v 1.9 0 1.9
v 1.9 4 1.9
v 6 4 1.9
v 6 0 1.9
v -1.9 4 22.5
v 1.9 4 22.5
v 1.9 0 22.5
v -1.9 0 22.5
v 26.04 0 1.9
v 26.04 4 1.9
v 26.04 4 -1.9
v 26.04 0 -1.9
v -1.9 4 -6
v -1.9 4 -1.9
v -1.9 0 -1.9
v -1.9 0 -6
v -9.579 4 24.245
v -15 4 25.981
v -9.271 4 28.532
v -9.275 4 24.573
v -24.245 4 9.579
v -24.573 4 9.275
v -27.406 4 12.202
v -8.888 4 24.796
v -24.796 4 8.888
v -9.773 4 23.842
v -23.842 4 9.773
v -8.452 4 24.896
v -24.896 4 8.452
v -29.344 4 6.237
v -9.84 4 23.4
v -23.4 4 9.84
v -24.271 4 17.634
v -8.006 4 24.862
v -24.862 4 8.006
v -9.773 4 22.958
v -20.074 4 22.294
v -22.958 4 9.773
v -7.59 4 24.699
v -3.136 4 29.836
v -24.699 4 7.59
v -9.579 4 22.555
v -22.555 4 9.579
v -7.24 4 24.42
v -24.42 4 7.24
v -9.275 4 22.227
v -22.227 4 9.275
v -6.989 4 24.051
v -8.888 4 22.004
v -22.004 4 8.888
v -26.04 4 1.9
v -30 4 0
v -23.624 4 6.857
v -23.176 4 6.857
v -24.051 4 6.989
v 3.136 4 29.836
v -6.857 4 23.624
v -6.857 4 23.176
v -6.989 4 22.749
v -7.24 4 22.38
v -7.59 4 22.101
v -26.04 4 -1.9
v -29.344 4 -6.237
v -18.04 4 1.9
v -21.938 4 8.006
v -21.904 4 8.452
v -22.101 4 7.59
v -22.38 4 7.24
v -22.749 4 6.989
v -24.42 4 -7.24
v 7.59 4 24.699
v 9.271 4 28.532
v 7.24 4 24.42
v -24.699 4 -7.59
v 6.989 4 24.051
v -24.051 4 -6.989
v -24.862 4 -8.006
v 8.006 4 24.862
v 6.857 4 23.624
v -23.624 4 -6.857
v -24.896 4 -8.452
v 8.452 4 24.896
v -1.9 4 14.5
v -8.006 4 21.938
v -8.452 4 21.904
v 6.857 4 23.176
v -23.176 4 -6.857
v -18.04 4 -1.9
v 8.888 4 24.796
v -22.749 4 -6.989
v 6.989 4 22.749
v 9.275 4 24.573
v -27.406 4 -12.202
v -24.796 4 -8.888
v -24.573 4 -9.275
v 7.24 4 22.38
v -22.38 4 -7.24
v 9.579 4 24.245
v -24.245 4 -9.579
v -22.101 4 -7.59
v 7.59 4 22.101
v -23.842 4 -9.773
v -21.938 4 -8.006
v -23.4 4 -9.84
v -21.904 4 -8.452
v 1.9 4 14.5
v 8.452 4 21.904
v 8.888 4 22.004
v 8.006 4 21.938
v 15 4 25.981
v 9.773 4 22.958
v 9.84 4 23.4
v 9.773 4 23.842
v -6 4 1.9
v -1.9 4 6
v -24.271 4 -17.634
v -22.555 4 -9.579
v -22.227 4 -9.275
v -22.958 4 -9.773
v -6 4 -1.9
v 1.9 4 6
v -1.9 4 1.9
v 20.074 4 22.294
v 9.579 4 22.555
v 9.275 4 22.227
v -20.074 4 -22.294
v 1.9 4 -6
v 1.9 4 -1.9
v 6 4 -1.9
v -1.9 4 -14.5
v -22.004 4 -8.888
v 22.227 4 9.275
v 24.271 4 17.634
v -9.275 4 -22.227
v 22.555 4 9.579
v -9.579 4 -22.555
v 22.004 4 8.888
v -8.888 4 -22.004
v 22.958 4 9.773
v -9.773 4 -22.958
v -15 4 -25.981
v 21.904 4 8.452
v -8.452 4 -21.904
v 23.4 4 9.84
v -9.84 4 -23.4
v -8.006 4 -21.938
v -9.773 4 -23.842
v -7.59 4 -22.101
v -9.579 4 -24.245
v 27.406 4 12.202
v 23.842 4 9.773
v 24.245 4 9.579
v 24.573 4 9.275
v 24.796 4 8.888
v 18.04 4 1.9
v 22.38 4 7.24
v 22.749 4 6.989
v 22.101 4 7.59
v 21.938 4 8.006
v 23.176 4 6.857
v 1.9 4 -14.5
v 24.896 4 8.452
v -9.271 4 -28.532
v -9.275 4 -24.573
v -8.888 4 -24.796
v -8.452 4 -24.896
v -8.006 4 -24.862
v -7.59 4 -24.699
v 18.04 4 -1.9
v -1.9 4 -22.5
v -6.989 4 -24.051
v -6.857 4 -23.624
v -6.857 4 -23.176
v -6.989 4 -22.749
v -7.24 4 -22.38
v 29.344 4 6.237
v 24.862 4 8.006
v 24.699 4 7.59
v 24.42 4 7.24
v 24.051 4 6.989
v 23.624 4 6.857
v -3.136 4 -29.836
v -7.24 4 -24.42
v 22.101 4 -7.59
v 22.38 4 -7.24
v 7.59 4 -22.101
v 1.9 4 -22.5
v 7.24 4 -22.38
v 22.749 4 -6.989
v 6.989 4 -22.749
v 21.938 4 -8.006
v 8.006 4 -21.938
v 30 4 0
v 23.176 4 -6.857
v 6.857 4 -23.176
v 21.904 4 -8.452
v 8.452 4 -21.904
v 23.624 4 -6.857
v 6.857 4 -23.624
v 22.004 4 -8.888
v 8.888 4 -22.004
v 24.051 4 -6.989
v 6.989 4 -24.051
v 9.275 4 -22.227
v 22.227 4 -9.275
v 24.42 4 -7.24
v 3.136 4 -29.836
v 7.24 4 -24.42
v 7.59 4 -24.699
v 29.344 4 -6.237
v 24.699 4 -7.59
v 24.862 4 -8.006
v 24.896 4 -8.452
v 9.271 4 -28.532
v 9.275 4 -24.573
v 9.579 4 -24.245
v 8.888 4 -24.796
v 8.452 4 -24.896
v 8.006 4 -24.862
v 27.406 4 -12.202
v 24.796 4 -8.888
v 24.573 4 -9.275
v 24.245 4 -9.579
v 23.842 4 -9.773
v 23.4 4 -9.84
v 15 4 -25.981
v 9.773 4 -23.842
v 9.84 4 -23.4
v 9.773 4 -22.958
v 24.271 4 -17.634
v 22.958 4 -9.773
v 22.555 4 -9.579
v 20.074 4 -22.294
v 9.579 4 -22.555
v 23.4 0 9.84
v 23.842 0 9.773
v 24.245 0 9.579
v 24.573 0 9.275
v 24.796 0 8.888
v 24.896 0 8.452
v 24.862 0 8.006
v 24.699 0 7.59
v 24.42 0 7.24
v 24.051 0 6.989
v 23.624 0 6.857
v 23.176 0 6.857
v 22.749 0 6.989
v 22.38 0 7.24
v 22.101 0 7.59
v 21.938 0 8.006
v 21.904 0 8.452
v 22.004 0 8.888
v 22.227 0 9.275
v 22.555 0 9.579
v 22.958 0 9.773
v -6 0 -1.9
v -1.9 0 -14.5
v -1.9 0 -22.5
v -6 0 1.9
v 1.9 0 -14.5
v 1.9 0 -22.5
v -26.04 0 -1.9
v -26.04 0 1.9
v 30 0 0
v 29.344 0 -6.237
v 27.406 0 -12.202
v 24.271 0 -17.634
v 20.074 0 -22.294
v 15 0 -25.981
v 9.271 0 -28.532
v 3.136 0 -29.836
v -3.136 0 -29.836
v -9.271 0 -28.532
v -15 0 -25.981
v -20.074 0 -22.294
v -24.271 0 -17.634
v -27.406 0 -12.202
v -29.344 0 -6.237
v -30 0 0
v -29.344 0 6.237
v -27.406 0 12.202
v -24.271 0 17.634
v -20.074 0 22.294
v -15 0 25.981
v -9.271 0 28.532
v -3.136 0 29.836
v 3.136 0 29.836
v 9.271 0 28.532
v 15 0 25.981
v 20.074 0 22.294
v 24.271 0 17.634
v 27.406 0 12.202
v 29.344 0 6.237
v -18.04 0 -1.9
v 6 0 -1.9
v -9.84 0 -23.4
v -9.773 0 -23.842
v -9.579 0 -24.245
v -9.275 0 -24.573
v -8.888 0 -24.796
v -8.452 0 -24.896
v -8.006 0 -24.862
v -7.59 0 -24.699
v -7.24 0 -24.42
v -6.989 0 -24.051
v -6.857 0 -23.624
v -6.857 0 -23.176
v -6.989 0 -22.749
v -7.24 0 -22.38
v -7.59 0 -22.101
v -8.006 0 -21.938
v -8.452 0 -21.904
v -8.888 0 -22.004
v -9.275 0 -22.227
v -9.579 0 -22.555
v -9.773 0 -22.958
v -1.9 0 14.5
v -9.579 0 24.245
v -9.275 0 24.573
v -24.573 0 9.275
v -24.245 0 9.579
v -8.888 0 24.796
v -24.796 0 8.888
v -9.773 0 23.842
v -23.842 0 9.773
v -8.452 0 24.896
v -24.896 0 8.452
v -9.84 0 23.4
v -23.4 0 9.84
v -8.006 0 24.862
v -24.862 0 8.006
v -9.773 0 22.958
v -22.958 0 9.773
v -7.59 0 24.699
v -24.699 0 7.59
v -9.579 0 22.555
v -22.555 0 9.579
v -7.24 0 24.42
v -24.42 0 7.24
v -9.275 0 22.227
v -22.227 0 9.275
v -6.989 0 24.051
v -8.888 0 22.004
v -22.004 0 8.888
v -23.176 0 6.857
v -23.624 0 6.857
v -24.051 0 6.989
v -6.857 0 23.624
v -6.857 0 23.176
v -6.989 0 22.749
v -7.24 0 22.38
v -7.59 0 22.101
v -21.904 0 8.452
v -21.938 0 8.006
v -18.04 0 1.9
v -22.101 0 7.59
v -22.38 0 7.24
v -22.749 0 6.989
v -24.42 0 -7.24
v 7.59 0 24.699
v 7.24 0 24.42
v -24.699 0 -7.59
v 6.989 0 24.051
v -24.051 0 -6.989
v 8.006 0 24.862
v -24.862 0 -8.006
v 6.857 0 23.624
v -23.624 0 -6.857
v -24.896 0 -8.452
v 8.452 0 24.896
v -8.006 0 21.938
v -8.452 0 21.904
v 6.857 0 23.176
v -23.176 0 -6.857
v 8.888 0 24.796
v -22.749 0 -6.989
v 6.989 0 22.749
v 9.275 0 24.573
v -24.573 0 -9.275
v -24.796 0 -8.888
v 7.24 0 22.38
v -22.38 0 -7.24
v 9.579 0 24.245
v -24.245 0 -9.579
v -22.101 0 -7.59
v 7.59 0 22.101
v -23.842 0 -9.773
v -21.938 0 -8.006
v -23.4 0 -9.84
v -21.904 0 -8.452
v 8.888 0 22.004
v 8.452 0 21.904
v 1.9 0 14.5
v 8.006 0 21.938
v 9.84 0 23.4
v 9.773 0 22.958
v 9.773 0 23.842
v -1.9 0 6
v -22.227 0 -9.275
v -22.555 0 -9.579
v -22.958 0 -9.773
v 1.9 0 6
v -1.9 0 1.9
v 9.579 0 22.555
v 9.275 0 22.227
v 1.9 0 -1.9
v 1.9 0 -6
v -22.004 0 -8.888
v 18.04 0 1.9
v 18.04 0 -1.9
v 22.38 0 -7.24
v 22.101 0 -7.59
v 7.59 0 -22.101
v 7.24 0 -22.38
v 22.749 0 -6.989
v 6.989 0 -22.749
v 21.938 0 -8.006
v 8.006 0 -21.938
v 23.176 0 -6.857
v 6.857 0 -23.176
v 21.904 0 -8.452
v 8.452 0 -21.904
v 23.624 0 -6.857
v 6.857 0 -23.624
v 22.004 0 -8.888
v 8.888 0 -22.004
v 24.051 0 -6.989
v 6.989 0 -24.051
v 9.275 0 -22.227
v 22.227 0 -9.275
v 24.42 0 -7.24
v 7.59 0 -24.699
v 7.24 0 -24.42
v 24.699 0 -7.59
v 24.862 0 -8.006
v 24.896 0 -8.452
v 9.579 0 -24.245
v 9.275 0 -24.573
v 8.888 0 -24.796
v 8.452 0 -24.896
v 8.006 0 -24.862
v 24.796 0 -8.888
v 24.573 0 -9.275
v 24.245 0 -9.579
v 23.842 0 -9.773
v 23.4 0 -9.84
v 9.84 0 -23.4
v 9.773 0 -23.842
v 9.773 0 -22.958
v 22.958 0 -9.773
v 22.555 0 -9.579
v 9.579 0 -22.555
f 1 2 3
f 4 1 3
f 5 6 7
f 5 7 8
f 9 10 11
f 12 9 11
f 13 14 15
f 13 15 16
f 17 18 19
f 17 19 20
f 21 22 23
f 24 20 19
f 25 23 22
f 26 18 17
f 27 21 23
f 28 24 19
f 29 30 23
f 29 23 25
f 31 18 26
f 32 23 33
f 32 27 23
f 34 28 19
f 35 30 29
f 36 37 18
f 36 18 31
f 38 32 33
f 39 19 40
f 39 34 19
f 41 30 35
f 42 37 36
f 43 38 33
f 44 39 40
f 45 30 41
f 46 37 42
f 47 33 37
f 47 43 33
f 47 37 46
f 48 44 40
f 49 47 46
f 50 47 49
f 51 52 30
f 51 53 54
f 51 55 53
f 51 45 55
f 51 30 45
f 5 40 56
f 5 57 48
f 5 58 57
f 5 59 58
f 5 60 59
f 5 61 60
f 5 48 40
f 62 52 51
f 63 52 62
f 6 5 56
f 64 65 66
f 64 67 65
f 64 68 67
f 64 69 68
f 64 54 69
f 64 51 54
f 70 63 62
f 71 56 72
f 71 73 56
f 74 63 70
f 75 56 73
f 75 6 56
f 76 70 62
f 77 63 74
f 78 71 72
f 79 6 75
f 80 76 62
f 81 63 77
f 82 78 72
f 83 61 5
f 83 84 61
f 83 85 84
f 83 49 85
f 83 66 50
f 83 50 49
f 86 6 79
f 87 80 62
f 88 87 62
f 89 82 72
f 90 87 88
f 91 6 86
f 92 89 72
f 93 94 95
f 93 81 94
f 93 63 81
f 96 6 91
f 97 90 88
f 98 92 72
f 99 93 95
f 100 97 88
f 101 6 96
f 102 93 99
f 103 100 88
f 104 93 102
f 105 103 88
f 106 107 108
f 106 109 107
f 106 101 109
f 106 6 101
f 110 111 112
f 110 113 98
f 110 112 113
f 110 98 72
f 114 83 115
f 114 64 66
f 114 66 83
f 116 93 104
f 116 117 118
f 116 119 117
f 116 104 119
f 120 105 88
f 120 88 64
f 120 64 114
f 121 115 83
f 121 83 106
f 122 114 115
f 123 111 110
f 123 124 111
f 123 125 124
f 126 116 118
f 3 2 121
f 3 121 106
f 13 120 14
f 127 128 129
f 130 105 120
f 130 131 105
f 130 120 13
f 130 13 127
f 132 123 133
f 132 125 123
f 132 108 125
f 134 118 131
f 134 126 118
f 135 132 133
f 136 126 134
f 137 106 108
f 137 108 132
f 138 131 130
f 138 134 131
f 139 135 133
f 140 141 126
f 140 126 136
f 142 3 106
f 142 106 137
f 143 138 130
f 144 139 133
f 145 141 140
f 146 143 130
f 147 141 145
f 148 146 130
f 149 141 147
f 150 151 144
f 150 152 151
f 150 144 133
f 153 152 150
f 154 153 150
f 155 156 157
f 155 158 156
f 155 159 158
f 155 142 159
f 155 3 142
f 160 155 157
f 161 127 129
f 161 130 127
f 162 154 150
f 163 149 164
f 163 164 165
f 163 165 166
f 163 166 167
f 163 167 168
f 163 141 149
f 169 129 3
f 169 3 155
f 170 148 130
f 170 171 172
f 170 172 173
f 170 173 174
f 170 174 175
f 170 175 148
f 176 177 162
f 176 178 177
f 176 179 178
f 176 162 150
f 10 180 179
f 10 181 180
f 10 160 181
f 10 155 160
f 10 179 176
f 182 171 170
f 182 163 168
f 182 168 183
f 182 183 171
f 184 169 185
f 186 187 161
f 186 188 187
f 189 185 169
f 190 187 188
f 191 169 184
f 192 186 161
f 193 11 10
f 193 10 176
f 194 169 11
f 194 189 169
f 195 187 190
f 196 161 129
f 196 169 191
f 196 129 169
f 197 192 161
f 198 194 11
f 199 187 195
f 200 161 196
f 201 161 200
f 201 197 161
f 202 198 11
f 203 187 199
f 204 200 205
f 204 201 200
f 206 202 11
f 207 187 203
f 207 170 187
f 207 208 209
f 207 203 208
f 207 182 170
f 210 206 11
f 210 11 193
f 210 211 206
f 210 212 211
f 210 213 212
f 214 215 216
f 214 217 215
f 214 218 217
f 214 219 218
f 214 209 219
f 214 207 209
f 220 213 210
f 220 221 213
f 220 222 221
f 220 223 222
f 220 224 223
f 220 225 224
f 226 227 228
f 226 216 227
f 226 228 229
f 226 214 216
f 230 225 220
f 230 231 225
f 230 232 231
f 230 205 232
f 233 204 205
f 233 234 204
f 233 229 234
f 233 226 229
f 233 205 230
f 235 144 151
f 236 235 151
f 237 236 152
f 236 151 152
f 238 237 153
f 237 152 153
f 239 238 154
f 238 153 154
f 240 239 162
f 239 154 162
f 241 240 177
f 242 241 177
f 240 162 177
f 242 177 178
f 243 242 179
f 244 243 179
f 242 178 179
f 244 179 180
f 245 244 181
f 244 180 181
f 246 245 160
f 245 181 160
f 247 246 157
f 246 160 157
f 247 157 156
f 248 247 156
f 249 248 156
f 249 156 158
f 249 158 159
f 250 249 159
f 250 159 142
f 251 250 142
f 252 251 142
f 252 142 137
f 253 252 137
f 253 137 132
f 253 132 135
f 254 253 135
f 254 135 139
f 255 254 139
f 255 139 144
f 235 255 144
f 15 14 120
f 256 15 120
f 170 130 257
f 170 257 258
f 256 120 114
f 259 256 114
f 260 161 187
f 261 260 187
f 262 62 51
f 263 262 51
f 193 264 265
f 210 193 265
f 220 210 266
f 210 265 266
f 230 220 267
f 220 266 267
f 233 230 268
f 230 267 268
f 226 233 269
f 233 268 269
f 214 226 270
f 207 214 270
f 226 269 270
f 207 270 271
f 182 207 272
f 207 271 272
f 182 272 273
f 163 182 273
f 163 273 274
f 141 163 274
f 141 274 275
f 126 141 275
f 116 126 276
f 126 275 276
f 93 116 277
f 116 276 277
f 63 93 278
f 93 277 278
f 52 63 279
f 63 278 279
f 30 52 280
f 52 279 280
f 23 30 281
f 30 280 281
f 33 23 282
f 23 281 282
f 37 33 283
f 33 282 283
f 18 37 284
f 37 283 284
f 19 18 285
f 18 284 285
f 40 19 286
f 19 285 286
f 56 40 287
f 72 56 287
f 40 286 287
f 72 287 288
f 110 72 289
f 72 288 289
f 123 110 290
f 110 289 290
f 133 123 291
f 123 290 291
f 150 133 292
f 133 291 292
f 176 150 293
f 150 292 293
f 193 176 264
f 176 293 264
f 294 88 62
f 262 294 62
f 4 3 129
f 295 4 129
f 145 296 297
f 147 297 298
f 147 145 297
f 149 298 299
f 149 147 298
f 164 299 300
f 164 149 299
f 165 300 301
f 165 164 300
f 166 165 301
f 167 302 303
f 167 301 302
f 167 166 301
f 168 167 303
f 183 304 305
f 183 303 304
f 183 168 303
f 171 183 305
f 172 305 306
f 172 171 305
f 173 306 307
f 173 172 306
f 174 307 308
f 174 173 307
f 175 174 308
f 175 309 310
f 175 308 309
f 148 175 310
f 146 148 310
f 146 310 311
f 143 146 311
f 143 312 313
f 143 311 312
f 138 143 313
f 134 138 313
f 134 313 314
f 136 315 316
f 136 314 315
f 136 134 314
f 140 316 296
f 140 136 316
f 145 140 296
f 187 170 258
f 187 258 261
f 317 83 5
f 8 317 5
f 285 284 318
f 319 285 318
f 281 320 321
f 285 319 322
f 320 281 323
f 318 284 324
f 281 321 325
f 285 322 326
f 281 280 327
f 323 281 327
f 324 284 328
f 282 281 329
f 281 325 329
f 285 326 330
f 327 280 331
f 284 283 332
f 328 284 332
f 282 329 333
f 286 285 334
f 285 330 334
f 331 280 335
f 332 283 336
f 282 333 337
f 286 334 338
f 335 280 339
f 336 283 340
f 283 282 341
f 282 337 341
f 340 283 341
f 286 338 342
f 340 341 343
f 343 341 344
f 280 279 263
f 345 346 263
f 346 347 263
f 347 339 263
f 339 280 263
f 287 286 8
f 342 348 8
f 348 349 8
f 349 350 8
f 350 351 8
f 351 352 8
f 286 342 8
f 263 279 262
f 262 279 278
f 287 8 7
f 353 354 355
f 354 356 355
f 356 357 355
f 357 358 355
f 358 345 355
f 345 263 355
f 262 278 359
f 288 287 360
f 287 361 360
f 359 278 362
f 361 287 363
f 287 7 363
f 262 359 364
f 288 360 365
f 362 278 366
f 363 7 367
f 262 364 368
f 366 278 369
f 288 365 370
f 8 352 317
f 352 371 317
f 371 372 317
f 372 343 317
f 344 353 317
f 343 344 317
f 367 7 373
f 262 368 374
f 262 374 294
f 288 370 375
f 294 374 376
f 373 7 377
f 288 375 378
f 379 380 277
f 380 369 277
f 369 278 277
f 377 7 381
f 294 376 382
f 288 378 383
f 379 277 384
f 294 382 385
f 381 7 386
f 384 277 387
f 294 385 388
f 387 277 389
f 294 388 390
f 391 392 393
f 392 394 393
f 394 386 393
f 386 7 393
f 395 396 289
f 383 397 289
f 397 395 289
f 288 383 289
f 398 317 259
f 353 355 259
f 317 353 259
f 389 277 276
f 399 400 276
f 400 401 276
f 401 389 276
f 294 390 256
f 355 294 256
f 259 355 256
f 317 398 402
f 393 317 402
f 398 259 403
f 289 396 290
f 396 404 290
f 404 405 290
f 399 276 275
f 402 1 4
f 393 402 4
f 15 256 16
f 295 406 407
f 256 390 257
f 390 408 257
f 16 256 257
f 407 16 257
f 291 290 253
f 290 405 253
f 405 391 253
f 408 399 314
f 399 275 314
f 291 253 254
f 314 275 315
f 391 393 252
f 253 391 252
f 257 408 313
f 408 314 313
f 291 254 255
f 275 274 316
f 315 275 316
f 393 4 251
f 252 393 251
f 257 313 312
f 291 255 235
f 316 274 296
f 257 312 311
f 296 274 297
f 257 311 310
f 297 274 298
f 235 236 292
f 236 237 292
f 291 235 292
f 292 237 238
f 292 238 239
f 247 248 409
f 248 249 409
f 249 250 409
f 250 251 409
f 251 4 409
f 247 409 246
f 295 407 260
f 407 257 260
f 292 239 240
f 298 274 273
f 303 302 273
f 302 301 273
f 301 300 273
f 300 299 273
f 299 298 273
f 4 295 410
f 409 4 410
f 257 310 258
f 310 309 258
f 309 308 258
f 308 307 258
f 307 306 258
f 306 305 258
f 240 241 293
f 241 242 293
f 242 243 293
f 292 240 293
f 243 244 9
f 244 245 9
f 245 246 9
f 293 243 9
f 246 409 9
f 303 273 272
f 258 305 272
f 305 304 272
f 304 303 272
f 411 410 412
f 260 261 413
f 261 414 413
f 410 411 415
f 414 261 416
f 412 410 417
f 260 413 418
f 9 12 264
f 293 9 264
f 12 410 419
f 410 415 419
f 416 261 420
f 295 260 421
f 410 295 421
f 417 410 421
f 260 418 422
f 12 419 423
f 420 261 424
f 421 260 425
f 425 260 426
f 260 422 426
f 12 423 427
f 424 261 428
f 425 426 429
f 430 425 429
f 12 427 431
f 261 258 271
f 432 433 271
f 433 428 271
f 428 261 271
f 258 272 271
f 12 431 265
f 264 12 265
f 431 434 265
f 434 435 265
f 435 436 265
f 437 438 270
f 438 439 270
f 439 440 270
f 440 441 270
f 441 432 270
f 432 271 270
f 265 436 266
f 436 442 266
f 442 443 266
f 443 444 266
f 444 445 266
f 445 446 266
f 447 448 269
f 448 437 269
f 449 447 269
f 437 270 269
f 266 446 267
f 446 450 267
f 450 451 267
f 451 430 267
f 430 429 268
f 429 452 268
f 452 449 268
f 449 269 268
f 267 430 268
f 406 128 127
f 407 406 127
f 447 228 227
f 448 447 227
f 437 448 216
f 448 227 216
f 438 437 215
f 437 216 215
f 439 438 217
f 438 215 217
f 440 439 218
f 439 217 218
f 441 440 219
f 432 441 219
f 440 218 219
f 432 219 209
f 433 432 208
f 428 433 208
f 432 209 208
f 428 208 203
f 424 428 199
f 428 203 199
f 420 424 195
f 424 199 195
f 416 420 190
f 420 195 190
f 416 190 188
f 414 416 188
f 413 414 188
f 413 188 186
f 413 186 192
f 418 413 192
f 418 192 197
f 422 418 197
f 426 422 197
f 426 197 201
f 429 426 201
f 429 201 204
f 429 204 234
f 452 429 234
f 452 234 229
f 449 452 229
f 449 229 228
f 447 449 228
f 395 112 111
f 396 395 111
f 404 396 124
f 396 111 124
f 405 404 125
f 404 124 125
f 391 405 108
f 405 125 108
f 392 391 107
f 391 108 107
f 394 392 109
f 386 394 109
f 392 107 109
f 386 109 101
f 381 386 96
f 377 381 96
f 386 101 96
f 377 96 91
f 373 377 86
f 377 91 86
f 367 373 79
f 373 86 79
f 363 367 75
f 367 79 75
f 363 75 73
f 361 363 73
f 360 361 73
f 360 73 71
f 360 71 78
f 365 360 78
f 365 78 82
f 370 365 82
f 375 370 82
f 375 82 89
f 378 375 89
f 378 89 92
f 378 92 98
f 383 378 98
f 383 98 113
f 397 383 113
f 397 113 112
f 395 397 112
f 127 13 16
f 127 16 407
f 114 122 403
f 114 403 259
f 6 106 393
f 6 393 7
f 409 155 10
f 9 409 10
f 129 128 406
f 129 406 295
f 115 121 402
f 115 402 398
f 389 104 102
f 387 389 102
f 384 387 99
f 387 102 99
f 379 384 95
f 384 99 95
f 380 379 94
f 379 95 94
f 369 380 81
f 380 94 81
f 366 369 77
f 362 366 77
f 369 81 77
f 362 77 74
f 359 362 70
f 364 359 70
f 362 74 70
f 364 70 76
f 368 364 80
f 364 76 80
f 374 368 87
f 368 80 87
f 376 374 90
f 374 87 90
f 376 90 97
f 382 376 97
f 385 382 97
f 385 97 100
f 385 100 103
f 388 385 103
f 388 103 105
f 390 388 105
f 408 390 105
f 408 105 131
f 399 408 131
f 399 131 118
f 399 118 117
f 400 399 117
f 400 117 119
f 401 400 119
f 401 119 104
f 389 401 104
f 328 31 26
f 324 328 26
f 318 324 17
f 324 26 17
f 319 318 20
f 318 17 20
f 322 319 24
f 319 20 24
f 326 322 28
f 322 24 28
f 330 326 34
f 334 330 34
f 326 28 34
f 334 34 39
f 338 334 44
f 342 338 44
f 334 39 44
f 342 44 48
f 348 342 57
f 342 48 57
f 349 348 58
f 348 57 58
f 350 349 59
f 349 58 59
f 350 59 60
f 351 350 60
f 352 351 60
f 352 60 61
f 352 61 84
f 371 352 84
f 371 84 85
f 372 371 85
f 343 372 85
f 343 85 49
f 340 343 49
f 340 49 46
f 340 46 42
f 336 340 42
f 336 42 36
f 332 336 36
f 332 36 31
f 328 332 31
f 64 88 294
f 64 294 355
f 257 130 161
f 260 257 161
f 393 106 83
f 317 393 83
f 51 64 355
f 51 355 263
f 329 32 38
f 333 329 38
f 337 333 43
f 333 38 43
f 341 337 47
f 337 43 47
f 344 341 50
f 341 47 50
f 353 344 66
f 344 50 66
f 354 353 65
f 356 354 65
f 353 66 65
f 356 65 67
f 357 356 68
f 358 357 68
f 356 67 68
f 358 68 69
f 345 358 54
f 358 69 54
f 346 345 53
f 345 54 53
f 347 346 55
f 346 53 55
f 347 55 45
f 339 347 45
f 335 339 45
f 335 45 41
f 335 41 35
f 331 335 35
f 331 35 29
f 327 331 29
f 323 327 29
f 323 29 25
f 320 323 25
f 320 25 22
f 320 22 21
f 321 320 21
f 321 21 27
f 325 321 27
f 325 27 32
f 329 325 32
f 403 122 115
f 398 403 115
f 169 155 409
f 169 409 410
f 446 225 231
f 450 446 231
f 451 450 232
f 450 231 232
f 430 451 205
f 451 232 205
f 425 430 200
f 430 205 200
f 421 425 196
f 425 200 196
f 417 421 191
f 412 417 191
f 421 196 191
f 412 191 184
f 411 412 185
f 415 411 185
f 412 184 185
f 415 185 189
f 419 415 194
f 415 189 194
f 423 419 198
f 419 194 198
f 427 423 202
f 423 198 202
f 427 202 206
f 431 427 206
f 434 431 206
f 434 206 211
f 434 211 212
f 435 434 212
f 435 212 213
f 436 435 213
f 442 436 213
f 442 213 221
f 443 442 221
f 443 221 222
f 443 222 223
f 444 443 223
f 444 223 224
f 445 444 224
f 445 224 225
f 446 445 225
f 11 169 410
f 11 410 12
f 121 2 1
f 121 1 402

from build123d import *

# Parameters (mm, degrees)
SKETCH1_R                   = 30
BOSS_EXTRUDE1_DEPTH         = 4
CUT_EXTRUDE3_START          = 4
SKETCH1_4_W                 = 3.8
SKETCH1_4_H                 = 6
SKETCH1_4_H_2               = 8
SKETCH1_4_W_2               = 6
SKETCH1_4_H_3               = 3.8
SKETCH1_4_W_3               = 8
CUT_EXTRUDE3_DEPTH          = 5
CUT_EXTRUDE5_START          = 4
SKETCH1_5_R                 = 1.5
CUT_EXTRUDE5_DEPTH          = 5
CIRPATTERN2_COUNT           = 4
CIRPATTERN2_START           = 4
CIRPATTERN2_COPY_1_SKETCH_R = 1.5
CIRPATTERN2_COPY_1_DEPTH    = 5
CIRPATTERN2_COPY_2_SKETCH_R = 1.5
CIRPATTERN2_COPY_2_DEPTH    = 5
CIRPATTERN2_COPY_3_SKETCH_R = 1.5
CIRPATTERN2_COPY_3_DEPTH    = 5
CIRPATTERN3_COUNT           = 2


with BuildPart() as part:
    # Sketch1 → Boss-Extrude1 (new body)
    with BuildSketch(Plane(origin=(0, 0, 0), x_dir=(1, 0, 0), z_dir=(0, 1, 0))):
        Circle(SKETCH1_R)
    extrude(amount=BOSS_EXTRUDE1_DEPTH)

    # Sketch1<4> → Cut-Extrude3 (cut, through all)
    with BuildSketch(Plane(origin=(0, 0, 0), x_dir=(1, 0, 0), z_dir=(0, 1, 0)).offset(CUT_EXTRUDE3_START)):
        with Locations((0, 3)):
            Rectangle(SKETCH1_4_W, SKETCH1_4_H)
        with Locations((0, 18.5)):
            Rectangle(SKETCH1_4_W, SKETCH1_4_H_2)
        with Locations((3, 0)):
            Rectangle(SKETCH1_4_W_2, SKETCH1_4_H_3)
        with Locations((22.04, 0)):
            Rectangle(SKETCH1_4_W_3, SKETCH1_4_H_3)
    cut_extrude3 = extrude(amount=-CUT_EXTRUDE3_DEPTH, mode=Mode.SUBTRACT)

    # Sketch1<5> → Cut-Extrude5 (cut, through all)
    with BuildSketch(Plane(origin=(0, 0, 0), x_dir=(1, 0, 0), z_dir=(0, 1, 0)).offset(CUT_EXTRUDE5_START)):
        with Locations((8.34, 23.4)):
            Circle(SKETCH1_5_R)
    cut_extrude5 = extrude(amount=-CUT_EXTRUDE5_DEPTH, mode=Mode.SUBTRACT)

    # Mirror1: Cut-Extrude5 across plane
    add(cut_extrude5.mirror(Plane(origin=(0, 0, 0), x_dir=(0, 0, 1), z_dir=(1, 0, 0))), mode=Mode.SUBTRACT)

    # CirPattern2: Cut-Extrude5 ×4 about axis
    cirpattern2_axis = Axis((0, 0, 0), (0, 1, 0))
    for i in range(1, CIRPATTERN2_COUNT):
        add(cut_extrude5.rotate(cirpattern2_axis, i * 360 / CIRPATTERN2_COUNT), mode=Mode.SUBTRACT)

    # CirPattern2 copy 1 sketch → CirPattern2 copy 1 (cut, through all)
    with BuildSketch(Plane.ZX.offset(CIRPATTERN2_START)):
        with Locations((8.34, -23.4)):
            Circle(CIRPATTERN2_COPY_1_SKETCH_R)
    extrude(amount=-CIRPATTERN2_COPY_1_DEPTH, mode=Mode.SUBTRACT)

    # CirPattern2 copy 2 sketch → CirPattern2 copy 2 (cut, through all)
    with BuildSketch(Plane(origin=(0, 0, 0), x_dir=(1, 0, 0), z_dir=(0, 1, 0)).offset(CIRPATTERN2_START)):
        with Locations((8.34, -23.4)):
            Circle(CIRPATTERN2_COPY_2_SKETCH_R)
    extrude(amount=-CIRPATTERN2_COPY_2_DEPTH, mode=Mode.SUBTRACT)

    # CirPattern2 copy 3 sketch → CirPattern2 copy 3 (cut, through all)
    with BuildSketch(Plane(origin=(0, 0, 0), x_dir=(0, 0, -1), z_dir=(0, 1, 0)).offset(CIRPATTERN2_START)):
        with Locations((8.34, -23.4)):
            Circle(CIRPATTERN2_COPY_3_SKETCH_R)
    extrude(amount=-CIRPATTERN2_COPY_3_DEPTH, mode=Mode.SUBTRACT)

    # CirPattern3: Cut-Extrude3 ×2 about axis
    cirpattern3_axis = Axis((0, 0, 0), (0, 1, 0))
    for i in range(1, CIRPATTERN3_COUNT):
        add(cut_extrude3.rotate(cirpattern3_axis, i * 360 / CIRPATTERN3_COUNT), mode=Mode.SUBTRACT)


solid = part.part
